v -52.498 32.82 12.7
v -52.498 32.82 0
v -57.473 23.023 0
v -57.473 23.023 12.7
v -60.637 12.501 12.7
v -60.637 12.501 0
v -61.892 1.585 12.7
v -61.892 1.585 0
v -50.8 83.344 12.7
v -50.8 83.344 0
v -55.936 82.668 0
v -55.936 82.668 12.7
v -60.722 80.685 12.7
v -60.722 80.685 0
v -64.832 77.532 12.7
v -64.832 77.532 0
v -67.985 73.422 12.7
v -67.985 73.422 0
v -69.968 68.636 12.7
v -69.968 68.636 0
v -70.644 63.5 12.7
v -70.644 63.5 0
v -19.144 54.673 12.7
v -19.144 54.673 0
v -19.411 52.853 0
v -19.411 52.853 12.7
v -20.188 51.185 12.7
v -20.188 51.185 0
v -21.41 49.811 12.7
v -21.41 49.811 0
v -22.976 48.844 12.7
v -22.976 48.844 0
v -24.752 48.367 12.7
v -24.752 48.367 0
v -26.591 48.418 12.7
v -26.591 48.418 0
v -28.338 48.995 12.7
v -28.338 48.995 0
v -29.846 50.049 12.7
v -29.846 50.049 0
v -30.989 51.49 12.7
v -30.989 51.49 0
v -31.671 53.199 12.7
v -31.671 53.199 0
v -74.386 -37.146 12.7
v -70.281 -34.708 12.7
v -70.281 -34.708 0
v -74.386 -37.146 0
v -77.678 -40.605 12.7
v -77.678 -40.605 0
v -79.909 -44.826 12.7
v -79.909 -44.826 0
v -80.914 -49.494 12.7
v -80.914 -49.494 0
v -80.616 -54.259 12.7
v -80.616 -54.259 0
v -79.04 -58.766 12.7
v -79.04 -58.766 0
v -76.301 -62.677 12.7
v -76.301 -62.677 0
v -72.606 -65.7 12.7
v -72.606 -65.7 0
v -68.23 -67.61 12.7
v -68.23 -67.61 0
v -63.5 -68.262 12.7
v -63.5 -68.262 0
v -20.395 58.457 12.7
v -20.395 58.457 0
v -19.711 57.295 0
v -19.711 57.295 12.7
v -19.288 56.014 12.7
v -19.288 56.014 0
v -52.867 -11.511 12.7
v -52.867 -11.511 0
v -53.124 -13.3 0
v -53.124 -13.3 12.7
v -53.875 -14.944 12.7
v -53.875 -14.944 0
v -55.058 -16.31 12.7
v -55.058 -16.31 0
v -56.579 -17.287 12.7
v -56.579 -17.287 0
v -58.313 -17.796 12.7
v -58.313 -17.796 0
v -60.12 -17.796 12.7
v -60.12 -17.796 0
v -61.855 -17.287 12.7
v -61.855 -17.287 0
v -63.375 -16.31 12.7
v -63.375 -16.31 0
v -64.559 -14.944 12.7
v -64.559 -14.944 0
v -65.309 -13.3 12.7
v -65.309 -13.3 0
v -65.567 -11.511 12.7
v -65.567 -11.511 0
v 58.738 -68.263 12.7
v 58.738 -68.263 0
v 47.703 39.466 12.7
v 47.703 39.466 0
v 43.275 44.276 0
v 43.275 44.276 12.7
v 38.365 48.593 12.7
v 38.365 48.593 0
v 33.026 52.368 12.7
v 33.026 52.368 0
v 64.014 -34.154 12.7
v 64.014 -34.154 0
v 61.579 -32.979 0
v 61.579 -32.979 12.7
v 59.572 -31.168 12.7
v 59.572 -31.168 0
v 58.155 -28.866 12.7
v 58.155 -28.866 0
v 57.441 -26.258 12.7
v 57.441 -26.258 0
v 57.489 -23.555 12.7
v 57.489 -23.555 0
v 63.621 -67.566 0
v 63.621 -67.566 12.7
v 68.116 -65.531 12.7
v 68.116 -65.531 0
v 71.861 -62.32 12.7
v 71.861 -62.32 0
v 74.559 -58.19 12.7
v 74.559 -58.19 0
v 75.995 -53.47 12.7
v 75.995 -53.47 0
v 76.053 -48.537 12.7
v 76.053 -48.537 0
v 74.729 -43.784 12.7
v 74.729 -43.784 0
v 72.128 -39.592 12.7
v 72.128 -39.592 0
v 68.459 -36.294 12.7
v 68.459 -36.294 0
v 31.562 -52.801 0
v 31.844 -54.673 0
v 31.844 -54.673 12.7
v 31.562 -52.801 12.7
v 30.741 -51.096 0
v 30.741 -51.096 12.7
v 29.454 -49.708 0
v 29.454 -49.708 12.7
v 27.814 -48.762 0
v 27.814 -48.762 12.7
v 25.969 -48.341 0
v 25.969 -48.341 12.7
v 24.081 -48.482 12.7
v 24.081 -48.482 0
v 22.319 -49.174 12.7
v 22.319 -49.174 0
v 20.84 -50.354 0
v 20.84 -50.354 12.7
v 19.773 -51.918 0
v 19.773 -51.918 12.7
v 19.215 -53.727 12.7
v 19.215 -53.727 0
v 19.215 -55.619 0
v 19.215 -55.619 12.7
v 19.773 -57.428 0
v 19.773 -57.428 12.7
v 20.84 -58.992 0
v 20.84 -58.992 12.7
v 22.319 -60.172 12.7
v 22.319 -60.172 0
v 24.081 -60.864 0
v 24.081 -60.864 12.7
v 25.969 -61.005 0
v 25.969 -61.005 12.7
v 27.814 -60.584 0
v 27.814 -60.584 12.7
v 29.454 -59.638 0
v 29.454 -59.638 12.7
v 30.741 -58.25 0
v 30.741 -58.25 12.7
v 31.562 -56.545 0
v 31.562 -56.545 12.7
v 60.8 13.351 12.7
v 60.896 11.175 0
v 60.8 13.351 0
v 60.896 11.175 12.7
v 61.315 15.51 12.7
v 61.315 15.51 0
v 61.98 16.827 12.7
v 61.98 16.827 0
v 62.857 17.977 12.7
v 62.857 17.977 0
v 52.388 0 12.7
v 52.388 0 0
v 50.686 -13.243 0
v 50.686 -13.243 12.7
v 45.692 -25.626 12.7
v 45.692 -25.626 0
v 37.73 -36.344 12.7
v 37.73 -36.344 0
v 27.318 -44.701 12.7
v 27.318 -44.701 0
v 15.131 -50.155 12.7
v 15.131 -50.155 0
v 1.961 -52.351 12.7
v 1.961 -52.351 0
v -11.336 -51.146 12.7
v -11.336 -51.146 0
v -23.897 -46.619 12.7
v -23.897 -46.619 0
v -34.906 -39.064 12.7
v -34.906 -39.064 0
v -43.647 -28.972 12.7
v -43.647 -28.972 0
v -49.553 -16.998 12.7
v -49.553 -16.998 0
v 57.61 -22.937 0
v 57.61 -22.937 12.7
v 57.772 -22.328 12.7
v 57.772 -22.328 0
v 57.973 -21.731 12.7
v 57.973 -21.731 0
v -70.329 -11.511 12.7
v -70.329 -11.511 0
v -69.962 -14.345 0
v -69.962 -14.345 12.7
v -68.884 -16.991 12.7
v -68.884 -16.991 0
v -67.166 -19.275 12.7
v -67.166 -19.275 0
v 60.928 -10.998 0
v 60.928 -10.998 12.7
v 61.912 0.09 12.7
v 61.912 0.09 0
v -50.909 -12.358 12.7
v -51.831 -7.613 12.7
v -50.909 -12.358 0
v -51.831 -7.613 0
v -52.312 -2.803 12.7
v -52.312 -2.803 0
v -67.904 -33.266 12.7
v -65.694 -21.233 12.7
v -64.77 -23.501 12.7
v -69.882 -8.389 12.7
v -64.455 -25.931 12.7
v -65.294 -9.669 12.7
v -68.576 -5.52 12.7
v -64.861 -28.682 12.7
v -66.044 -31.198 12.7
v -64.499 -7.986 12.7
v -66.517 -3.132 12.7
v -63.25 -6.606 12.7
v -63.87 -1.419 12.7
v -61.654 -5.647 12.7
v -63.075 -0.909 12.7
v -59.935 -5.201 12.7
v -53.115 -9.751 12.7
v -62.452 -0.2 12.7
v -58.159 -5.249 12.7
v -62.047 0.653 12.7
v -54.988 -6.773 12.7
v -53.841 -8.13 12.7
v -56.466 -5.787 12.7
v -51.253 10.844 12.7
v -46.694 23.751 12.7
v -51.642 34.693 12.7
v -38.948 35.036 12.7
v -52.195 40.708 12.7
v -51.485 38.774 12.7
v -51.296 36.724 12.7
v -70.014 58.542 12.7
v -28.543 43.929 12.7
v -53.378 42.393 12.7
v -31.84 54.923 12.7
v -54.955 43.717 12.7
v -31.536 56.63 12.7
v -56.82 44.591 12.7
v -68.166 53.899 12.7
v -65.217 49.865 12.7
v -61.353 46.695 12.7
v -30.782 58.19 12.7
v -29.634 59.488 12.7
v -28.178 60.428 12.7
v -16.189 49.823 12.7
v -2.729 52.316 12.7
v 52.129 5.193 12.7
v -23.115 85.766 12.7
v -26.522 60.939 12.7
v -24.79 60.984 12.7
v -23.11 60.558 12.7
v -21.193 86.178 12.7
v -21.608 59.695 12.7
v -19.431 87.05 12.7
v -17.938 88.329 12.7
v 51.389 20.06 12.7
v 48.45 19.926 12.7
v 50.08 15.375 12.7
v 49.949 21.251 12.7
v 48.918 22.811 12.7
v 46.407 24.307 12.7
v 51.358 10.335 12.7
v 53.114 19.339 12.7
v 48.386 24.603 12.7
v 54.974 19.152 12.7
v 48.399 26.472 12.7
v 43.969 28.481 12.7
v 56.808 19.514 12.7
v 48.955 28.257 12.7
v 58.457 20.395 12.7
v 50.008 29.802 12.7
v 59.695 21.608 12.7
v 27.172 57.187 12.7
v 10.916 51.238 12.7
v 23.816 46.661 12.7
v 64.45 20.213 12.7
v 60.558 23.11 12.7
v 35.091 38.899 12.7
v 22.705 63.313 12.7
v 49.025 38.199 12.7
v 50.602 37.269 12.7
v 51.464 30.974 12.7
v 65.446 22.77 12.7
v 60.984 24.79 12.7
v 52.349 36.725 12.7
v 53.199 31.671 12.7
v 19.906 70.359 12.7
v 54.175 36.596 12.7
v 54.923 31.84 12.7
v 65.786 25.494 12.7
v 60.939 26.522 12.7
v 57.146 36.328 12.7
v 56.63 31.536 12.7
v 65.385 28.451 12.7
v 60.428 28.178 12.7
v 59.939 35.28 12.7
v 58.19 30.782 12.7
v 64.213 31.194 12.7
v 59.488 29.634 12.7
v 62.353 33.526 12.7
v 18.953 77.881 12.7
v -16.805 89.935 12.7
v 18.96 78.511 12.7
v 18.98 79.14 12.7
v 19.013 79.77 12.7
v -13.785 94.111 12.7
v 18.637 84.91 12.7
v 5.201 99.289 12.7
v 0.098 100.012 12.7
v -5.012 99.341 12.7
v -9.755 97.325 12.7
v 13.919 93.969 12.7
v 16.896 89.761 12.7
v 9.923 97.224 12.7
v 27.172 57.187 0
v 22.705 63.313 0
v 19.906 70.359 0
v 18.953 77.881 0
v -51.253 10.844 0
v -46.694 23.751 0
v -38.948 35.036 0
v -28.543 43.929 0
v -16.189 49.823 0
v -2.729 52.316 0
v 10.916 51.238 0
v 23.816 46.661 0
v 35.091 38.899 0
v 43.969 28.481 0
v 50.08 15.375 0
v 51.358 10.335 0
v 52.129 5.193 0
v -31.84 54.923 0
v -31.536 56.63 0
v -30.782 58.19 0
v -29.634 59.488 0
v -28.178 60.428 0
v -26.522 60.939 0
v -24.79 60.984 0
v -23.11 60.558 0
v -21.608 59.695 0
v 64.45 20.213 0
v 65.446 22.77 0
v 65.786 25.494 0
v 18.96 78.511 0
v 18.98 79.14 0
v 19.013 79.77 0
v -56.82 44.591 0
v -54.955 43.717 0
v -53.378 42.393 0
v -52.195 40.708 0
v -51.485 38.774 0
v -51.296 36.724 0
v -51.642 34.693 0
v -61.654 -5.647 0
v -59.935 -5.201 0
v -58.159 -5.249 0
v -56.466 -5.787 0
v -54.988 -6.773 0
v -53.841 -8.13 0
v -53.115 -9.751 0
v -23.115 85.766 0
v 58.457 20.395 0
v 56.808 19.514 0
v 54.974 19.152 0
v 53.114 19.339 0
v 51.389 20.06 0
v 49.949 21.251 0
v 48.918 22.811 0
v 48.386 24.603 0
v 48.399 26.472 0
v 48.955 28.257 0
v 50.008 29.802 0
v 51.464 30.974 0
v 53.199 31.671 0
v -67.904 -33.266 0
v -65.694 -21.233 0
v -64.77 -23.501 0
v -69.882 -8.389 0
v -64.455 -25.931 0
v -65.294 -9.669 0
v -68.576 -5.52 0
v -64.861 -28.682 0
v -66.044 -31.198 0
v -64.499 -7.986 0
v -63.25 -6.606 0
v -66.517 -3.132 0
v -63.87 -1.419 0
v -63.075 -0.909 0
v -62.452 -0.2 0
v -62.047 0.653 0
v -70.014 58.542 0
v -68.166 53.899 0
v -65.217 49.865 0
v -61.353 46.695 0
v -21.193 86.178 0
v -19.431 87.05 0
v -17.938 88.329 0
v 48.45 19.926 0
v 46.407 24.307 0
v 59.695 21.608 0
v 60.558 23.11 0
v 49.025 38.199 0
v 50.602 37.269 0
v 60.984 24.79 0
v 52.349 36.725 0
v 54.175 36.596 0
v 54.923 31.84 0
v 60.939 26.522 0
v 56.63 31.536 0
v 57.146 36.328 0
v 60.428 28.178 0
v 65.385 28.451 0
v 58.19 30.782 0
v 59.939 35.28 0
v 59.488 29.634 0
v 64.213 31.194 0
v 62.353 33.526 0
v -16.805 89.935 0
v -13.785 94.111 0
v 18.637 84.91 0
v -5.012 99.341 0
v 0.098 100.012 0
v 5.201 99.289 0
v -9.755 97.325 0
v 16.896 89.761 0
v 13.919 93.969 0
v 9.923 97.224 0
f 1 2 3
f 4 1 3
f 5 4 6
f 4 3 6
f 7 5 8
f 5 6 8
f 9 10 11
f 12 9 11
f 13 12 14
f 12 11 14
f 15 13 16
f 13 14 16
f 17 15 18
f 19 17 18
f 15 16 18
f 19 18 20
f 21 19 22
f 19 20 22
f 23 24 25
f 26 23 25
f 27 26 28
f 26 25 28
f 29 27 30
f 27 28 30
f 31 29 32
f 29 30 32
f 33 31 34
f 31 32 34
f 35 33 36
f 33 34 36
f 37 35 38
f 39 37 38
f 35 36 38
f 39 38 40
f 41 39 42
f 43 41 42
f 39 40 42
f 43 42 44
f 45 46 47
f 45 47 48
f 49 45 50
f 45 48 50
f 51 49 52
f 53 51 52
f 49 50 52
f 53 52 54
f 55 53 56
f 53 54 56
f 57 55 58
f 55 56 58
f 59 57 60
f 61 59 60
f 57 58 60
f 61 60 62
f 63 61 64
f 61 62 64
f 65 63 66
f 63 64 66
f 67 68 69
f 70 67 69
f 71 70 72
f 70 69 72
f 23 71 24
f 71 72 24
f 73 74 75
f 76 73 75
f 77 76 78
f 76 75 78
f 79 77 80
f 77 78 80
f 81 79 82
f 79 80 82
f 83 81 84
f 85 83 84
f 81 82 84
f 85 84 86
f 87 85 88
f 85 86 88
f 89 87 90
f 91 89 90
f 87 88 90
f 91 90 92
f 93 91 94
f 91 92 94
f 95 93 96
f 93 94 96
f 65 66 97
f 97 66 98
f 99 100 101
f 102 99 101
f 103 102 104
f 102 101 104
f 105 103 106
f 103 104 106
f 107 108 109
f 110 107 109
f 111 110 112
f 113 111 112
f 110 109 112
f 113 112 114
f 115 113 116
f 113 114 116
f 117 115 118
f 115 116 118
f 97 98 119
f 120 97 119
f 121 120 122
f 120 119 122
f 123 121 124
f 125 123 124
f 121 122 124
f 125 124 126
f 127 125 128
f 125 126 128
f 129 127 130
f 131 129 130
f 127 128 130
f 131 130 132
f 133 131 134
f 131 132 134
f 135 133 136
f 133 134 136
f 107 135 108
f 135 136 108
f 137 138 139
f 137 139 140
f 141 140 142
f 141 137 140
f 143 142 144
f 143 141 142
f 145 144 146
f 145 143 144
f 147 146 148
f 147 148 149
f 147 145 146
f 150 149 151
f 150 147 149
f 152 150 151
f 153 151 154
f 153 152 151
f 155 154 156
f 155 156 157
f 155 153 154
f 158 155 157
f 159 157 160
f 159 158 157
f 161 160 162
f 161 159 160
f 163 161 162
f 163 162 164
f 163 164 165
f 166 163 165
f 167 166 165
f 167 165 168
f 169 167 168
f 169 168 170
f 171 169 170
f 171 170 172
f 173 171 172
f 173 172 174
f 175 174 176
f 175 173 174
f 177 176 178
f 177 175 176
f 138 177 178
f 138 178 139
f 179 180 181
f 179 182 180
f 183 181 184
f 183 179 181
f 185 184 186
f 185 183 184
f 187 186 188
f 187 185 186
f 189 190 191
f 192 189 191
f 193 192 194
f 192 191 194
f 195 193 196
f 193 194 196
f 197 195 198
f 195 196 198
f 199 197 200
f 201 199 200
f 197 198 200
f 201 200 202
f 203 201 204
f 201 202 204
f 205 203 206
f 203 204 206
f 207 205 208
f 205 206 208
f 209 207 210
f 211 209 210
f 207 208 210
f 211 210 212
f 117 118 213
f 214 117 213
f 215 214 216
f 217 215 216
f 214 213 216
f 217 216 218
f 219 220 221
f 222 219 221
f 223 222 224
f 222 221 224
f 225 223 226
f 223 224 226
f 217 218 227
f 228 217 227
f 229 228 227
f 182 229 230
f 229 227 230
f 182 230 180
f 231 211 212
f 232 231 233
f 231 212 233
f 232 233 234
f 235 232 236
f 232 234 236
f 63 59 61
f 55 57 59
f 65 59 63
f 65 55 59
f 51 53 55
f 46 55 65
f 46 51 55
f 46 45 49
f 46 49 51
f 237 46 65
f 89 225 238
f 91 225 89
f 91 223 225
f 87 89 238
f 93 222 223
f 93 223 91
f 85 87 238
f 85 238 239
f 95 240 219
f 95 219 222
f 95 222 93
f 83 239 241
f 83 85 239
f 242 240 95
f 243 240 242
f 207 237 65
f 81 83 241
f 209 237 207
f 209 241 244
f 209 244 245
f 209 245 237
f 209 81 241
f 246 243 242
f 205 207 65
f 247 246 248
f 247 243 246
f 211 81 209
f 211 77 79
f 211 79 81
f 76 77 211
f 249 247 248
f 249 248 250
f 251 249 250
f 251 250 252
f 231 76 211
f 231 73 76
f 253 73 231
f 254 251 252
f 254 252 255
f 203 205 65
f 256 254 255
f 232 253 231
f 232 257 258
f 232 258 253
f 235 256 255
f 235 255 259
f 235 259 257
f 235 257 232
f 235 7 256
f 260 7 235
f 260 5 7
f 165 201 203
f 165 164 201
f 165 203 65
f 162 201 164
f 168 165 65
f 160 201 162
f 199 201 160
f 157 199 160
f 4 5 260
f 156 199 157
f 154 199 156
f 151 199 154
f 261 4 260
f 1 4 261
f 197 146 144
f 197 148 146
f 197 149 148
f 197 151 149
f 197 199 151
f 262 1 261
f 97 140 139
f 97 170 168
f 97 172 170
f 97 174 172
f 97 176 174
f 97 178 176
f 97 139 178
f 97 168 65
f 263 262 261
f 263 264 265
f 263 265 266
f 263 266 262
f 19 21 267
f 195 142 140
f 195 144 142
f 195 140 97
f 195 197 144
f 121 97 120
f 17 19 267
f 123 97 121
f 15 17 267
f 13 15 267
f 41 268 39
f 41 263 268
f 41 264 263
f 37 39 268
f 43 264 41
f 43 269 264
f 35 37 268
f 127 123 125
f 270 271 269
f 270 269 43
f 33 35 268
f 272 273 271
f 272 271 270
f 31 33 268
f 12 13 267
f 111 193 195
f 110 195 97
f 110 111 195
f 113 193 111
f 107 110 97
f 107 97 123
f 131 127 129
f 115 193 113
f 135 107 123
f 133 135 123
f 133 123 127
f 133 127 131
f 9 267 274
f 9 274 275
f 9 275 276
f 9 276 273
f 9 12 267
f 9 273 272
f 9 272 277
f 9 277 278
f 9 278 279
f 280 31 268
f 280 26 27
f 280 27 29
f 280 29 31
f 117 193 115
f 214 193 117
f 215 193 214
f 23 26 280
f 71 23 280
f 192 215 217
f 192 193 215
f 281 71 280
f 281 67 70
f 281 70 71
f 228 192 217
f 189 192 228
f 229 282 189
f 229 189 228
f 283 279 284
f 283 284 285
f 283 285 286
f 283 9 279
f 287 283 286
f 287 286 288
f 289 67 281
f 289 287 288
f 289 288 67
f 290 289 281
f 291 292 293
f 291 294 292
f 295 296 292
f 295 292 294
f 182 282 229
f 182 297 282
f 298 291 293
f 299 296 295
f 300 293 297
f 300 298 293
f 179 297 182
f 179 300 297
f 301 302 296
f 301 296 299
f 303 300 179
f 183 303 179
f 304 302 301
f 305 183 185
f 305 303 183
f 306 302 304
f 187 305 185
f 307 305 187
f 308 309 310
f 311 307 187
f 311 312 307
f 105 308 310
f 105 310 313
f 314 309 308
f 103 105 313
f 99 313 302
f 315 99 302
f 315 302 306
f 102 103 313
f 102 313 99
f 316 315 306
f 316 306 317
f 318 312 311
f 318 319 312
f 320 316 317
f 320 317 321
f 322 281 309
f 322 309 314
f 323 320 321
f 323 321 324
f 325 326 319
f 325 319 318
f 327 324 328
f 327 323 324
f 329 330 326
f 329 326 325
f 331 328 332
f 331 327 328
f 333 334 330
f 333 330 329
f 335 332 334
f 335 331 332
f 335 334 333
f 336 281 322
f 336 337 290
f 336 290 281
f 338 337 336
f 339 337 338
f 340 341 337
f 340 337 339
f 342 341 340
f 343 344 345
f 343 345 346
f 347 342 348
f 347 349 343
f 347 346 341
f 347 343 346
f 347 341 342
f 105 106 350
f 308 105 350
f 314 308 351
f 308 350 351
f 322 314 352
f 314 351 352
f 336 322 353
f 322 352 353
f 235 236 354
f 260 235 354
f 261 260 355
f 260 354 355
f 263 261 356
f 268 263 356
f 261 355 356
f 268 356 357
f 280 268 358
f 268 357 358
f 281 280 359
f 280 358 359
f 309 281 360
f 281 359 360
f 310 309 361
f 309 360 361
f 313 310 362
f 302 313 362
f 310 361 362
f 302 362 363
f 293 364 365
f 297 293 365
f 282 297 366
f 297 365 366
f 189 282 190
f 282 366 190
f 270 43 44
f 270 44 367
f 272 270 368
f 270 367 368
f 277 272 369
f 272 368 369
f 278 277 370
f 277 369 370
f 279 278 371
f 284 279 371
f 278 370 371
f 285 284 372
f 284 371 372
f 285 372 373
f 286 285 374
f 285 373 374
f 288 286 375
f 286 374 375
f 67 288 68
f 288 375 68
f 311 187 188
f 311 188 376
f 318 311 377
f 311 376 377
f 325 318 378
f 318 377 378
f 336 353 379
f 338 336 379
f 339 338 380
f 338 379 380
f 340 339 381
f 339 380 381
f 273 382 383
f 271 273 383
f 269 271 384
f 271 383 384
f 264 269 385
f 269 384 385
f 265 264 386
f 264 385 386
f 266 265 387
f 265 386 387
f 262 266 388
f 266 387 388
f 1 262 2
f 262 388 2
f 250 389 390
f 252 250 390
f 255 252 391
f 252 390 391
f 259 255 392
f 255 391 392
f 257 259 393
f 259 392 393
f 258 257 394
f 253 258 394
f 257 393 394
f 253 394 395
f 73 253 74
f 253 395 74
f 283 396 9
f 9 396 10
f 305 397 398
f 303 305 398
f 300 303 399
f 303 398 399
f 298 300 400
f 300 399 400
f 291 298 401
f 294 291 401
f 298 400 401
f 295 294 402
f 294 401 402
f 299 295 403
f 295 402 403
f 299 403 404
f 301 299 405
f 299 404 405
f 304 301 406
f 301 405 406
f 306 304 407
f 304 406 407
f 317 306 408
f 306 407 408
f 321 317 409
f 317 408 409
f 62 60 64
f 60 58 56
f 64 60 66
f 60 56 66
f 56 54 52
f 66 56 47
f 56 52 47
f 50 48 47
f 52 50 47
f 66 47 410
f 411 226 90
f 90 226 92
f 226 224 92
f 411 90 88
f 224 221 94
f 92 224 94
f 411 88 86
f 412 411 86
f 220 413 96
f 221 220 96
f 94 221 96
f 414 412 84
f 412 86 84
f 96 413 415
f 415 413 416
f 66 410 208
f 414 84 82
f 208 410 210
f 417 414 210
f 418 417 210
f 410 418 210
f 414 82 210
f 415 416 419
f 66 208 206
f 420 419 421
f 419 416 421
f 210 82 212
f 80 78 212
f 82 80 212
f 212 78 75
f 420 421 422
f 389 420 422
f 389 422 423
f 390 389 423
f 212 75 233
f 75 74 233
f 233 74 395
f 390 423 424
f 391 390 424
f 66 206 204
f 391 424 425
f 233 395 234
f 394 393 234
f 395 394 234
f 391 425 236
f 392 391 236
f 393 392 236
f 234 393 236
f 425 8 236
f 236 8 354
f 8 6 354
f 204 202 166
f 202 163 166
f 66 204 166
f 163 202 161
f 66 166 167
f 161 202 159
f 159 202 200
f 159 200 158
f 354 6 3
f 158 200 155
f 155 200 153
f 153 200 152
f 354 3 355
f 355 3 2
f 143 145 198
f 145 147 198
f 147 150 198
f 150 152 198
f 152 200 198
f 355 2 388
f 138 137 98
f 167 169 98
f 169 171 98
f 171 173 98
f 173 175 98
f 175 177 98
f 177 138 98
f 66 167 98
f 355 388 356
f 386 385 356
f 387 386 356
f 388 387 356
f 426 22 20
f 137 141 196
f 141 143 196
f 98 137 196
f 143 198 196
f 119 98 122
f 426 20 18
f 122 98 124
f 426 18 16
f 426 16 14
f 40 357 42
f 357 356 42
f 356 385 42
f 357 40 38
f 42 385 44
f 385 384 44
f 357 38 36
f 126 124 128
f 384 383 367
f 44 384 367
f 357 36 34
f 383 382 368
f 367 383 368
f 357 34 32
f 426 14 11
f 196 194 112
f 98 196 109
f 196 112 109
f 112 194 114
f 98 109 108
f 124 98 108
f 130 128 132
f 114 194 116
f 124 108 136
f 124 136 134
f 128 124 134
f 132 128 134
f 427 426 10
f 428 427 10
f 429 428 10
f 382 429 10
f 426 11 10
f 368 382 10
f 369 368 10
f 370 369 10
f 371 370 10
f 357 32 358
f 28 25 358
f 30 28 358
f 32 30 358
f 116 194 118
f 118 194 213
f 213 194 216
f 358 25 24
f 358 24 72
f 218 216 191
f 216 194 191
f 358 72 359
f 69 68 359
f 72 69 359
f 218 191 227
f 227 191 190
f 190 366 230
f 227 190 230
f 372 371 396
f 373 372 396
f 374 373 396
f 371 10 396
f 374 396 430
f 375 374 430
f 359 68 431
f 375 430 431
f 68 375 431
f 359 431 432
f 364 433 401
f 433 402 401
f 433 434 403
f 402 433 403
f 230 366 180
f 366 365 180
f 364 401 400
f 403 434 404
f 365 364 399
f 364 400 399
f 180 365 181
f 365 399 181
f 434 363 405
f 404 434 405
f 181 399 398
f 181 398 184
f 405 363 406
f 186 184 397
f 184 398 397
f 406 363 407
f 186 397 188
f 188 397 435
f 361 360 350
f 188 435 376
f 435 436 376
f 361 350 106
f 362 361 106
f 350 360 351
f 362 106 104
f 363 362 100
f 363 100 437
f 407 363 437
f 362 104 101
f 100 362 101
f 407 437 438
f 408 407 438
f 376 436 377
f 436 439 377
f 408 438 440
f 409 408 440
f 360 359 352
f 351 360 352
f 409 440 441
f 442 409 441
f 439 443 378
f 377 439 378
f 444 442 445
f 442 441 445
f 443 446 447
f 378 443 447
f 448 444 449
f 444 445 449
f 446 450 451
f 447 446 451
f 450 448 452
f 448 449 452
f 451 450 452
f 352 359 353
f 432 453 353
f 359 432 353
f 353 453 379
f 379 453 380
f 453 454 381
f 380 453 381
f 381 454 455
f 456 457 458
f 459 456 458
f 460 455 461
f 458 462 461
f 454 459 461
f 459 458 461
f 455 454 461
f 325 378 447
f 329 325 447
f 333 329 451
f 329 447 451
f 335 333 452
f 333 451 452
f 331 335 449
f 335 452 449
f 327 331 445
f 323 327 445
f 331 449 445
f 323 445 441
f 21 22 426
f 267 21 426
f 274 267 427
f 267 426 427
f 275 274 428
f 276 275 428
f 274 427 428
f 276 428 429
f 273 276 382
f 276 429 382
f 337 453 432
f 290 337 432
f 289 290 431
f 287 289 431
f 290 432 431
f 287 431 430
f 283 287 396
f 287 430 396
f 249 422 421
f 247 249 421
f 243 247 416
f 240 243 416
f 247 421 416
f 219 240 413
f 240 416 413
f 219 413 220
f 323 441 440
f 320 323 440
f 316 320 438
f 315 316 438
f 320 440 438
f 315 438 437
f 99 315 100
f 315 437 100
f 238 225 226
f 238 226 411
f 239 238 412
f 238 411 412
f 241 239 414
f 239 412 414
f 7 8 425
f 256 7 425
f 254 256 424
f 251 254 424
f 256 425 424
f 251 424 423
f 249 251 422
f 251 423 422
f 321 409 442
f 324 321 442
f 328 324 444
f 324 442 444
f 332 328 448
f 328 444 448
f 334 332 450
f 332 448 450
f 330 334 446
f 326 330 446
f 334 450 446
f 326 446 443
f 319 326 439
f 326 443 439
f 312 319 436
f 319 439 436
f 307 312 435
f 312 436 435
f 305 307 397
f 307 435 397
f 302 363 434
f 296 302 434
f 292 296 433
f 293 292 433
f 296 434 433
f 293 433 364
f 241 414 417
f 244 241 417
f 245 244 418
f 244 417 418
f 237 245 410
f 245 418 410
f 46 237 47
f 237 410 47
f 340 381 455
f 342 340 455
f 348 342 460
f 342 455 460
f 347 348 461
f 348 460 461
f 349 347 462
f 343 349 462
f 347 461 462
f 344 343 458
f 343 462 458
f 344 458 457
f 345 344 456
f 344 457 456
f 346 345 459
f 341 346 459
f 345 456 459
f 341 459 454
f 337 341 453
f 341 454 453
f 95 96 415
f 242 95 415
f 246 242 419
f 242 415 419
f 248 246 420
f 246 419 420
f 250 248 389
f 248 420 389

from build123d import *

# Parameters (mm, degrees)
F0_R     = 6.35
F1_DEPTH = 12.7
F2_R     = 7.9375


with BuildPart() as f1:
    # F0 (on Top) → F1 (new body)
    with BuildSketch(Plane.XY):
        with BuildLine():
            ThreePointArc((50.0804162666, 15.375371957), (51.8075185828, 7.7737490661), (52.3875, 0))
            ThreePointArc((52.3875, 0), (8.6161289731, -51.6740987127), (-49.5533247299, -16.9975929021))
            ThreePointArc((-49.5533247299, -16.9975929021), (-51.4249940729, -9.9960062453), (-52.312453003, -2.8031084642))
            ThreePointArc((-52.312453003, -2.8031084642), (-56.8688591942, -0.6489004527), (-61.9082087133, -0.7289376965))
            ThreePointArc((-61.9082087133, -0.7289376965), (-61.8302354833, -3.1905542348), (-61.6544213285, -5.6471220008))
            ThreePointArc((-61.6544213285, -5.6471220008), (-55.692265244, -6.2283994183), (-52.8666598415, -11.5105526461))
            ThreePointArc((-52.8666598415, -11.5105526461), (-59.2166598415, -17.8605526461), (-65.5666598415, -11.5105526461))
            Line((-65.5666598415, -11.5105526461), (-70.3291598415, -11.5105526461))
            ThreePointArc((-70.3291598415, -11.5105526461), (-69.508132002, -15.702599523), (-67.166368927, -19.2752021362))
            ThreePointArc((-67.166368927, -19.2752021362), (-65.1591434342, -22.3374329476), (-64.4554052861, -25.9306159849))
            ThreePointArc((-64.4554052861, -25.9306159849), (-66.044465468, -31.1981091461), (-70.2814387145, -34.7080456373))
            ThreePointArc((-70.2814387145, -34.7080456373), (-80.6164344901, -54.2592739984), (-63.5, -68.2625))
            Line((-63.5, -68.2625), (0, -68.2625))
            Line((0, -68.2625), (58.7375, -68.2625))
            ThreePointArc((58.7375, -68.2625), (75.9947089073, -53.4697653418), (64.0142585669, -34.153837521))
            ThreePointArc((64.0142585669, -34.153837521), (58.7813342607, -30.0675851979), (57.4893859738, -23.5551490588))
            ThreePointArc((57.4893859738, -23.5551490588), (57.686142675, -22.631002937), (57.9734917775, -21.7308975281))
            ThreePointArc((57.9734917775, -21.7308975281), (61.831190131, -3.1719998798), (59.8929243466, 15.6842363367))
            ThreePointArc((59.8929243466, 15.6842363367), (55.0226278067, 14.3874475529), (50.0804162666, 15.375371957))
        make_face()
        with Locations((25.4944466395, -54.673017253)):
            Circle(F0_R, mode=Mode.SUBTRACT)
        with BuildLine():
            ThreePointArc((43.9692893127, 28.4807260018), (47.4791991934, 22.1399141869), (50.0804162666, 15.375371957))
            ThreePointArc((50.0804162666, 15.375371957), (55.0226278067, 14.3874475529), (59.8929243466, 15.6842363367))
            ThreePointArc((59.8929243466, 15.6842363367), (59.2217483156, 18.053868912), (58.456859062, 20.394932823))
            ThreePointArc((58.456859062, 20.394932823), (48.9179628053, 22.8108206775), (53.1987696631, 31.6709419276))
            ThreePointArc((53.1987696631, 31.6709419276), (51.8970719981, 33.7616879655), (50.5132517682, 35.7990090932))
            ThreePointArc((50.5132517682, 35.7990090932), (46.3892876551, 32.9017052551), (43.9692893127, 28.4807260018))
        make_face()
        with BuildLine():
            ThreePointArc((-52.312453003, -2.8031084642), (-16.1886277928, 49.8234732474), (43.9692893127, 28.4807260018))
            ThreePointArc((43.9692893127, 28.4807260018), (46.3892876551, 32.9017052551), (50.5132517682, 35.7990090932))
            ThreePointArc((50.5132517682, 35.7990090932), (52.310310906, 36.3528661823), (54.1750282482, 36.5957827393))
            ThreePointArc((54.1750282482, 36.5957827393), (50.6015982243, 37.2692654479), (47.7034897917, 39.4656143744))
            ThreePointArc((47.7034897917, 39.4656143744), (40.8771414604, 46.4996447543), (33.0262233797, 52.3681795132))
            ThreePointArc((33.0262233797, 52.3681795132), (17.1888443577, 59.4785783783), (-4.35e-08, 61.9125))
            ThreePointArc((-4.35e-08, 61.9125), (-10.3428083822, 61.0424767766), (-20.394932823, 58.456859062))
            ThreePointArc((-20.394932823, 58.456859062), (-19.4651675477, 56.6655768212), (-19.1444466395, 54.673017253))
            ThreePointArc((-19.1444466395, 54.673017253), (-24.7522354429, 48.3665426007), (-31.6709419276, 53.1987696631))
            ThreePointArc((-31.6709419276, 53.1987696631), (-43.3001474916, 44.252173771), (-52.4975053225, 32.8202618997))
            ThreePointArc((-52.4975053225, 32.8202618997), (-59.2888527637, 17.8322627339), (-61.8922171982, 1.5846471339))
            ThreePointArc((-61.8922171982, 1.5846471339), (-62.4517909232, -0.1996749025), (-63.8695481256, -1.4190568766))
            ThreePointArc((-63.8695481256, -1.4190568766), (-68.5759567517, -5.5196247049), (-70.3291598415, -11.5105526461))
            Line((-70.3291598415, -11.5105526461), (-65.5666598415, -11.5105526461))
            ThreePointArc((-65.5666598415, -11.5105526461), (-64.4988130692, -7.9861580486), (-61.6544213285, -5.6471220008))
            ThreePointArc((-61.6544213285, -5.6471220008), (-61.8302354833, -3.1905542348), (-61.9082087133, -0.7289376965))
            ThreePointArc((-61.9082087133, -0.7289376965), (-56.8688591942, -0.6489004527), (-52.312453003, -2.8031084642))
        make_face()
        with BuildLine():
            ThreePointArc((58.456859062, 20.394932823), (59.2217483156, 18.053868912), (59.8929243466, 15.6842363367))
            ThreePointArc((59.8929243466, 15.6842363367), (64.1991359229, 19.7724959812), (65.785517253, 25.4944466395))
            ThreePointArc((65.785517253, 25.4944466395), (62.3526576558, 33.526306918), (54.1750282482, 36.5957827393))
            ThreePointArc((54.1750282482, 36.5957827393), (52.310310906, 36.3528661823), (50.5132517682, 35.7990090932))
            ThreePointArc((50.5132517682, 35.7990090932), (51.8970719981, 33.7616879655), (53.1987696631, 31.6709419276))
            ThreePointArc((53.1987696631, 31.6709419276), (58.6075456748, 30.4786202017), (61.023017253, 25.4944466395))
            ThreePointArc((61.023017253, 25.4944466395), (60.3453137671, 22.6400548906), (58.456859062, 20.394932823))
        make_face()
        with BuildLine():
            ThreePointArc((-4.35e-08, 61.9125), (17.1888443577, 59.4785783783), (33.0262233797, 52.3681795132))
            ThreePointArc((33.0262233797, 52.3681795132), (22.7049210277, 63.3125798927), (18.9534219493, 77.8808823529))
            ThreePointArc((18.9534219493, 77.8808823529), (18.9682238309, 78.8257127153), (19.0126149481, 79.7696157495))
            ThreePointArc((19.0126149481, 79.7696157495), (13.041818397, 67.0767708906), (-4.35e-08, 61.9125))
        make_face()
        with BuildLine():
            ThreePointArc((-20.394932823, 58.456859062), (-10.3428083822, 61.0424767766), (-4.35e-08, 61.9125))
            ThreePointArc((-4.35e-08, 61.9125), (-3.8885649879, 62.3135975568), (-7.6133825433, 63.5))
            Line((-7.6133825433, 63.5), (-50.8, 63.5))
            Line((-50.8, 63.5), (-70.64375, 63.5))
            ThreePointArc((-70.64375, 63.5), (-66.8192563388, 51.788559422), (-56.8199676592, 44.5914198459))
            ThreePointArc((-56.8199676592, 44.5914198459), (-51.7769282768, 39.7640636512), (-52.4975053225, 32.8202618997))
            ThreePointArc((-52.4975053225, 32.8202618997), (-43.3001474916, 44.252173771), (-31.6709419276, 53.1987696631))
            ThreePointArc((-31.6709419276, 53.1987696631), (-28.1780726016, 60.4280717007), (-20.394932823, 58.456859062))
        make_face()
        with BuildLine():
            ThreePointArc((-7.6133825433, 63.5), (-3.8885649879, 62.3135975568), (-4.35e-08, 61.9125))
            ThreePointArc((-4.35e-08, 61.9125), (13.041818397, 67.0767708906), (19.0126149481, 79.7696157495))
            ThreePointArc((19.0126149481, 79.7696157495), (5.2010600776, 99.2887509551), (-16.8048050509, 89.934736466))
            ThreePointArc((-16.8048050509, 89.934736466), (-19.4314787596, 87.050449272), (-23.1150084474, 85.7658729107))
            Line((-23.1150084474, 85.7658729107), (-50.8, 83.34375))
            ThreePointArc((-50.8, 83.34375), (-64.8316501892, 77.5316501892), (-70.64375, 63.5))
            Line((-70.64375, 63.5), (-50.8, 63.5))
            Line((-50.8, 63.5), (-7.6133825433, 63.5))
        make_face()
    extrude(amount=F1_DEPTH)

    # F2
    f2_edges = [f1.edges().sort_by_distance(p)[0] for p in [
        (59.892924, 15.684236, 6.35),
    ]]
    fillet(f2_edges, radius=F2_R)


solid = f1.part
